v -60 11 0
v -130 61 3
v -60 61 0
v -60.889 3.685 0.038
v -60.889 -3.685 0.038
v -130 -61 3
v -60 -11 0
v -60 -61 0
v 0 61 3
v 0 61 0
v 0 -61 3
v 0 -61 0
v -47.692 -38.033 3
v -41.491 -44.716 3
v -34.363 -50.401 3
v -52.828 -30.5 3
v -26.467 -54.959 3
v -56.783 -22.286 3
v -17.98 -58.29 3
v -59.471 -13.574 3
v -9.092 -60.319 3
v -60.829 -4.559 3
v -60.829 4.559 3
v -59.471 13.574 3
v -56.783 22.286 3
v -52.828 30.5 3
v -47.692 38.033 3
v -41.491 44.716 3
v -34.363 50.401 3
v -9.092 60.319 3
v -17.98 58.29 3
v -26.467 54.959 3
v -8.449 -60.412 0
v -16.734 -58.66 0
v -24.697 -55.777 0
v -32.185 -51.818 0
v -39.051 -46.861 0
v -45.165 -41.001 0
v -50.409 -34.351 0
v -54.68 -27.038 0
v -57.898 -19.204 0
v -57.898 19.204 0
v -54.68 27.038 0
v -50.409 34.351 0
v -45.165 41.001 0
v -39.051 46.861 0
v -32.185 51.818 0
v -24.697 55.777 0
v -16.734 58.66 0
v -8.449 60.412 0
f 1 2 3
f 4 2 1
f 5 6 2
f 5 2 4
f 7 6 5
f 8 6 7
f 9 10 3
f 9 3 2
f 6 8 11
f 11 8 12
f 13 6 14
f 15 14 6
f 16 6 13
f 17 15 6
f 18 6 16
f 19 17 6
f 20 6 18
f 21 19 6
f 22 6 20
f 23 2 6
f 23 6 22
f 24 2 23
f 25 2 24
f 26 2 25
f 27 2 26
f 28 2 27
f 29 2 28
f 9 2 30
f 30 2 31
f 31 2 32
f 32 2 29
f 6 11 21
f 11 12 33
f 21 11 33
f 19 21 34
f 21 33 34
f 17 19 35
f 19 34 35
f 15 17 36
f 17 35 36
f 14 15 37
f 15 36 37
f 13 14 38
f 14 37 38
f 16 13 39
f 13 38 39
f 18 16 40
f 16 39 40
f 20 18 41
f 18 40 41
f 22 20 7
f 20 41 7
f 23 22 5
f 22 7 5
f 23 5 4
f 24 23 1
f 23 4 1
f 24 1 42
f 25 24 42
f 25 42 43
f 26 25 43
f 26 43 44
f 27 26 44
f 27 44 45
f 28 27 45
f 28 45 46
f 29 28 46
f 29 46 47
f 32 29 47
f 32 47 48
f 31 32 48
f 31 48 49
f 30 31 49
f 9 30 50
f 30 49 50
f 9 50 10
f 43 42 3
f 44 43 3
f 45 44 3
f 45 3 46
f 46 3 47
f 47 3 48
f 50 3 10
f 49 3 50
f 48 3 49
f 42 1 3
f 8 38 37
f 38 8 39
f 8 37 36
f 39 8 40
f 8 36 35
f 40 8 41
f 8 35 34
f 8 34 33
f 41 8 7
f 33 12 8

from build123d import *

# Parameters (mm, degrees)
BOSS_EXTRUDE1_DEPTH = 3
CUT_EXTRUDE1_DEPTH  = 123


with BuildPart() as part:
    # Sketch1 → Boss-Extrude1 (new body)
    with BuildSketch(Plane.XY):
        with BuildLine():
            Line((0, 61), (-130, 61))
            Line((-130, 61), (-130, -61))
            Line((-130, -61), (0, -61))
            ThreePointArc((0, -61), (-61, 0), (0, 61))
        make_face()
    extrude(amount=BOSS_EXTRUDE1_DEPTH)

    # Sketch3 → Cut-Extrude1 (cut)
    with BuildSketch(Plane(origin=(0, -61, 0), x_dir=(-1, 0, 0), z_dir=(0, -1, 0))):
        Polygon((130, -3), (60, 0), (130, 0), align=None)
    extrude(amount=-CUT_EXTRUDE1_DEPTH, mode=Mode.SUBTRACT)


solid = part.part
